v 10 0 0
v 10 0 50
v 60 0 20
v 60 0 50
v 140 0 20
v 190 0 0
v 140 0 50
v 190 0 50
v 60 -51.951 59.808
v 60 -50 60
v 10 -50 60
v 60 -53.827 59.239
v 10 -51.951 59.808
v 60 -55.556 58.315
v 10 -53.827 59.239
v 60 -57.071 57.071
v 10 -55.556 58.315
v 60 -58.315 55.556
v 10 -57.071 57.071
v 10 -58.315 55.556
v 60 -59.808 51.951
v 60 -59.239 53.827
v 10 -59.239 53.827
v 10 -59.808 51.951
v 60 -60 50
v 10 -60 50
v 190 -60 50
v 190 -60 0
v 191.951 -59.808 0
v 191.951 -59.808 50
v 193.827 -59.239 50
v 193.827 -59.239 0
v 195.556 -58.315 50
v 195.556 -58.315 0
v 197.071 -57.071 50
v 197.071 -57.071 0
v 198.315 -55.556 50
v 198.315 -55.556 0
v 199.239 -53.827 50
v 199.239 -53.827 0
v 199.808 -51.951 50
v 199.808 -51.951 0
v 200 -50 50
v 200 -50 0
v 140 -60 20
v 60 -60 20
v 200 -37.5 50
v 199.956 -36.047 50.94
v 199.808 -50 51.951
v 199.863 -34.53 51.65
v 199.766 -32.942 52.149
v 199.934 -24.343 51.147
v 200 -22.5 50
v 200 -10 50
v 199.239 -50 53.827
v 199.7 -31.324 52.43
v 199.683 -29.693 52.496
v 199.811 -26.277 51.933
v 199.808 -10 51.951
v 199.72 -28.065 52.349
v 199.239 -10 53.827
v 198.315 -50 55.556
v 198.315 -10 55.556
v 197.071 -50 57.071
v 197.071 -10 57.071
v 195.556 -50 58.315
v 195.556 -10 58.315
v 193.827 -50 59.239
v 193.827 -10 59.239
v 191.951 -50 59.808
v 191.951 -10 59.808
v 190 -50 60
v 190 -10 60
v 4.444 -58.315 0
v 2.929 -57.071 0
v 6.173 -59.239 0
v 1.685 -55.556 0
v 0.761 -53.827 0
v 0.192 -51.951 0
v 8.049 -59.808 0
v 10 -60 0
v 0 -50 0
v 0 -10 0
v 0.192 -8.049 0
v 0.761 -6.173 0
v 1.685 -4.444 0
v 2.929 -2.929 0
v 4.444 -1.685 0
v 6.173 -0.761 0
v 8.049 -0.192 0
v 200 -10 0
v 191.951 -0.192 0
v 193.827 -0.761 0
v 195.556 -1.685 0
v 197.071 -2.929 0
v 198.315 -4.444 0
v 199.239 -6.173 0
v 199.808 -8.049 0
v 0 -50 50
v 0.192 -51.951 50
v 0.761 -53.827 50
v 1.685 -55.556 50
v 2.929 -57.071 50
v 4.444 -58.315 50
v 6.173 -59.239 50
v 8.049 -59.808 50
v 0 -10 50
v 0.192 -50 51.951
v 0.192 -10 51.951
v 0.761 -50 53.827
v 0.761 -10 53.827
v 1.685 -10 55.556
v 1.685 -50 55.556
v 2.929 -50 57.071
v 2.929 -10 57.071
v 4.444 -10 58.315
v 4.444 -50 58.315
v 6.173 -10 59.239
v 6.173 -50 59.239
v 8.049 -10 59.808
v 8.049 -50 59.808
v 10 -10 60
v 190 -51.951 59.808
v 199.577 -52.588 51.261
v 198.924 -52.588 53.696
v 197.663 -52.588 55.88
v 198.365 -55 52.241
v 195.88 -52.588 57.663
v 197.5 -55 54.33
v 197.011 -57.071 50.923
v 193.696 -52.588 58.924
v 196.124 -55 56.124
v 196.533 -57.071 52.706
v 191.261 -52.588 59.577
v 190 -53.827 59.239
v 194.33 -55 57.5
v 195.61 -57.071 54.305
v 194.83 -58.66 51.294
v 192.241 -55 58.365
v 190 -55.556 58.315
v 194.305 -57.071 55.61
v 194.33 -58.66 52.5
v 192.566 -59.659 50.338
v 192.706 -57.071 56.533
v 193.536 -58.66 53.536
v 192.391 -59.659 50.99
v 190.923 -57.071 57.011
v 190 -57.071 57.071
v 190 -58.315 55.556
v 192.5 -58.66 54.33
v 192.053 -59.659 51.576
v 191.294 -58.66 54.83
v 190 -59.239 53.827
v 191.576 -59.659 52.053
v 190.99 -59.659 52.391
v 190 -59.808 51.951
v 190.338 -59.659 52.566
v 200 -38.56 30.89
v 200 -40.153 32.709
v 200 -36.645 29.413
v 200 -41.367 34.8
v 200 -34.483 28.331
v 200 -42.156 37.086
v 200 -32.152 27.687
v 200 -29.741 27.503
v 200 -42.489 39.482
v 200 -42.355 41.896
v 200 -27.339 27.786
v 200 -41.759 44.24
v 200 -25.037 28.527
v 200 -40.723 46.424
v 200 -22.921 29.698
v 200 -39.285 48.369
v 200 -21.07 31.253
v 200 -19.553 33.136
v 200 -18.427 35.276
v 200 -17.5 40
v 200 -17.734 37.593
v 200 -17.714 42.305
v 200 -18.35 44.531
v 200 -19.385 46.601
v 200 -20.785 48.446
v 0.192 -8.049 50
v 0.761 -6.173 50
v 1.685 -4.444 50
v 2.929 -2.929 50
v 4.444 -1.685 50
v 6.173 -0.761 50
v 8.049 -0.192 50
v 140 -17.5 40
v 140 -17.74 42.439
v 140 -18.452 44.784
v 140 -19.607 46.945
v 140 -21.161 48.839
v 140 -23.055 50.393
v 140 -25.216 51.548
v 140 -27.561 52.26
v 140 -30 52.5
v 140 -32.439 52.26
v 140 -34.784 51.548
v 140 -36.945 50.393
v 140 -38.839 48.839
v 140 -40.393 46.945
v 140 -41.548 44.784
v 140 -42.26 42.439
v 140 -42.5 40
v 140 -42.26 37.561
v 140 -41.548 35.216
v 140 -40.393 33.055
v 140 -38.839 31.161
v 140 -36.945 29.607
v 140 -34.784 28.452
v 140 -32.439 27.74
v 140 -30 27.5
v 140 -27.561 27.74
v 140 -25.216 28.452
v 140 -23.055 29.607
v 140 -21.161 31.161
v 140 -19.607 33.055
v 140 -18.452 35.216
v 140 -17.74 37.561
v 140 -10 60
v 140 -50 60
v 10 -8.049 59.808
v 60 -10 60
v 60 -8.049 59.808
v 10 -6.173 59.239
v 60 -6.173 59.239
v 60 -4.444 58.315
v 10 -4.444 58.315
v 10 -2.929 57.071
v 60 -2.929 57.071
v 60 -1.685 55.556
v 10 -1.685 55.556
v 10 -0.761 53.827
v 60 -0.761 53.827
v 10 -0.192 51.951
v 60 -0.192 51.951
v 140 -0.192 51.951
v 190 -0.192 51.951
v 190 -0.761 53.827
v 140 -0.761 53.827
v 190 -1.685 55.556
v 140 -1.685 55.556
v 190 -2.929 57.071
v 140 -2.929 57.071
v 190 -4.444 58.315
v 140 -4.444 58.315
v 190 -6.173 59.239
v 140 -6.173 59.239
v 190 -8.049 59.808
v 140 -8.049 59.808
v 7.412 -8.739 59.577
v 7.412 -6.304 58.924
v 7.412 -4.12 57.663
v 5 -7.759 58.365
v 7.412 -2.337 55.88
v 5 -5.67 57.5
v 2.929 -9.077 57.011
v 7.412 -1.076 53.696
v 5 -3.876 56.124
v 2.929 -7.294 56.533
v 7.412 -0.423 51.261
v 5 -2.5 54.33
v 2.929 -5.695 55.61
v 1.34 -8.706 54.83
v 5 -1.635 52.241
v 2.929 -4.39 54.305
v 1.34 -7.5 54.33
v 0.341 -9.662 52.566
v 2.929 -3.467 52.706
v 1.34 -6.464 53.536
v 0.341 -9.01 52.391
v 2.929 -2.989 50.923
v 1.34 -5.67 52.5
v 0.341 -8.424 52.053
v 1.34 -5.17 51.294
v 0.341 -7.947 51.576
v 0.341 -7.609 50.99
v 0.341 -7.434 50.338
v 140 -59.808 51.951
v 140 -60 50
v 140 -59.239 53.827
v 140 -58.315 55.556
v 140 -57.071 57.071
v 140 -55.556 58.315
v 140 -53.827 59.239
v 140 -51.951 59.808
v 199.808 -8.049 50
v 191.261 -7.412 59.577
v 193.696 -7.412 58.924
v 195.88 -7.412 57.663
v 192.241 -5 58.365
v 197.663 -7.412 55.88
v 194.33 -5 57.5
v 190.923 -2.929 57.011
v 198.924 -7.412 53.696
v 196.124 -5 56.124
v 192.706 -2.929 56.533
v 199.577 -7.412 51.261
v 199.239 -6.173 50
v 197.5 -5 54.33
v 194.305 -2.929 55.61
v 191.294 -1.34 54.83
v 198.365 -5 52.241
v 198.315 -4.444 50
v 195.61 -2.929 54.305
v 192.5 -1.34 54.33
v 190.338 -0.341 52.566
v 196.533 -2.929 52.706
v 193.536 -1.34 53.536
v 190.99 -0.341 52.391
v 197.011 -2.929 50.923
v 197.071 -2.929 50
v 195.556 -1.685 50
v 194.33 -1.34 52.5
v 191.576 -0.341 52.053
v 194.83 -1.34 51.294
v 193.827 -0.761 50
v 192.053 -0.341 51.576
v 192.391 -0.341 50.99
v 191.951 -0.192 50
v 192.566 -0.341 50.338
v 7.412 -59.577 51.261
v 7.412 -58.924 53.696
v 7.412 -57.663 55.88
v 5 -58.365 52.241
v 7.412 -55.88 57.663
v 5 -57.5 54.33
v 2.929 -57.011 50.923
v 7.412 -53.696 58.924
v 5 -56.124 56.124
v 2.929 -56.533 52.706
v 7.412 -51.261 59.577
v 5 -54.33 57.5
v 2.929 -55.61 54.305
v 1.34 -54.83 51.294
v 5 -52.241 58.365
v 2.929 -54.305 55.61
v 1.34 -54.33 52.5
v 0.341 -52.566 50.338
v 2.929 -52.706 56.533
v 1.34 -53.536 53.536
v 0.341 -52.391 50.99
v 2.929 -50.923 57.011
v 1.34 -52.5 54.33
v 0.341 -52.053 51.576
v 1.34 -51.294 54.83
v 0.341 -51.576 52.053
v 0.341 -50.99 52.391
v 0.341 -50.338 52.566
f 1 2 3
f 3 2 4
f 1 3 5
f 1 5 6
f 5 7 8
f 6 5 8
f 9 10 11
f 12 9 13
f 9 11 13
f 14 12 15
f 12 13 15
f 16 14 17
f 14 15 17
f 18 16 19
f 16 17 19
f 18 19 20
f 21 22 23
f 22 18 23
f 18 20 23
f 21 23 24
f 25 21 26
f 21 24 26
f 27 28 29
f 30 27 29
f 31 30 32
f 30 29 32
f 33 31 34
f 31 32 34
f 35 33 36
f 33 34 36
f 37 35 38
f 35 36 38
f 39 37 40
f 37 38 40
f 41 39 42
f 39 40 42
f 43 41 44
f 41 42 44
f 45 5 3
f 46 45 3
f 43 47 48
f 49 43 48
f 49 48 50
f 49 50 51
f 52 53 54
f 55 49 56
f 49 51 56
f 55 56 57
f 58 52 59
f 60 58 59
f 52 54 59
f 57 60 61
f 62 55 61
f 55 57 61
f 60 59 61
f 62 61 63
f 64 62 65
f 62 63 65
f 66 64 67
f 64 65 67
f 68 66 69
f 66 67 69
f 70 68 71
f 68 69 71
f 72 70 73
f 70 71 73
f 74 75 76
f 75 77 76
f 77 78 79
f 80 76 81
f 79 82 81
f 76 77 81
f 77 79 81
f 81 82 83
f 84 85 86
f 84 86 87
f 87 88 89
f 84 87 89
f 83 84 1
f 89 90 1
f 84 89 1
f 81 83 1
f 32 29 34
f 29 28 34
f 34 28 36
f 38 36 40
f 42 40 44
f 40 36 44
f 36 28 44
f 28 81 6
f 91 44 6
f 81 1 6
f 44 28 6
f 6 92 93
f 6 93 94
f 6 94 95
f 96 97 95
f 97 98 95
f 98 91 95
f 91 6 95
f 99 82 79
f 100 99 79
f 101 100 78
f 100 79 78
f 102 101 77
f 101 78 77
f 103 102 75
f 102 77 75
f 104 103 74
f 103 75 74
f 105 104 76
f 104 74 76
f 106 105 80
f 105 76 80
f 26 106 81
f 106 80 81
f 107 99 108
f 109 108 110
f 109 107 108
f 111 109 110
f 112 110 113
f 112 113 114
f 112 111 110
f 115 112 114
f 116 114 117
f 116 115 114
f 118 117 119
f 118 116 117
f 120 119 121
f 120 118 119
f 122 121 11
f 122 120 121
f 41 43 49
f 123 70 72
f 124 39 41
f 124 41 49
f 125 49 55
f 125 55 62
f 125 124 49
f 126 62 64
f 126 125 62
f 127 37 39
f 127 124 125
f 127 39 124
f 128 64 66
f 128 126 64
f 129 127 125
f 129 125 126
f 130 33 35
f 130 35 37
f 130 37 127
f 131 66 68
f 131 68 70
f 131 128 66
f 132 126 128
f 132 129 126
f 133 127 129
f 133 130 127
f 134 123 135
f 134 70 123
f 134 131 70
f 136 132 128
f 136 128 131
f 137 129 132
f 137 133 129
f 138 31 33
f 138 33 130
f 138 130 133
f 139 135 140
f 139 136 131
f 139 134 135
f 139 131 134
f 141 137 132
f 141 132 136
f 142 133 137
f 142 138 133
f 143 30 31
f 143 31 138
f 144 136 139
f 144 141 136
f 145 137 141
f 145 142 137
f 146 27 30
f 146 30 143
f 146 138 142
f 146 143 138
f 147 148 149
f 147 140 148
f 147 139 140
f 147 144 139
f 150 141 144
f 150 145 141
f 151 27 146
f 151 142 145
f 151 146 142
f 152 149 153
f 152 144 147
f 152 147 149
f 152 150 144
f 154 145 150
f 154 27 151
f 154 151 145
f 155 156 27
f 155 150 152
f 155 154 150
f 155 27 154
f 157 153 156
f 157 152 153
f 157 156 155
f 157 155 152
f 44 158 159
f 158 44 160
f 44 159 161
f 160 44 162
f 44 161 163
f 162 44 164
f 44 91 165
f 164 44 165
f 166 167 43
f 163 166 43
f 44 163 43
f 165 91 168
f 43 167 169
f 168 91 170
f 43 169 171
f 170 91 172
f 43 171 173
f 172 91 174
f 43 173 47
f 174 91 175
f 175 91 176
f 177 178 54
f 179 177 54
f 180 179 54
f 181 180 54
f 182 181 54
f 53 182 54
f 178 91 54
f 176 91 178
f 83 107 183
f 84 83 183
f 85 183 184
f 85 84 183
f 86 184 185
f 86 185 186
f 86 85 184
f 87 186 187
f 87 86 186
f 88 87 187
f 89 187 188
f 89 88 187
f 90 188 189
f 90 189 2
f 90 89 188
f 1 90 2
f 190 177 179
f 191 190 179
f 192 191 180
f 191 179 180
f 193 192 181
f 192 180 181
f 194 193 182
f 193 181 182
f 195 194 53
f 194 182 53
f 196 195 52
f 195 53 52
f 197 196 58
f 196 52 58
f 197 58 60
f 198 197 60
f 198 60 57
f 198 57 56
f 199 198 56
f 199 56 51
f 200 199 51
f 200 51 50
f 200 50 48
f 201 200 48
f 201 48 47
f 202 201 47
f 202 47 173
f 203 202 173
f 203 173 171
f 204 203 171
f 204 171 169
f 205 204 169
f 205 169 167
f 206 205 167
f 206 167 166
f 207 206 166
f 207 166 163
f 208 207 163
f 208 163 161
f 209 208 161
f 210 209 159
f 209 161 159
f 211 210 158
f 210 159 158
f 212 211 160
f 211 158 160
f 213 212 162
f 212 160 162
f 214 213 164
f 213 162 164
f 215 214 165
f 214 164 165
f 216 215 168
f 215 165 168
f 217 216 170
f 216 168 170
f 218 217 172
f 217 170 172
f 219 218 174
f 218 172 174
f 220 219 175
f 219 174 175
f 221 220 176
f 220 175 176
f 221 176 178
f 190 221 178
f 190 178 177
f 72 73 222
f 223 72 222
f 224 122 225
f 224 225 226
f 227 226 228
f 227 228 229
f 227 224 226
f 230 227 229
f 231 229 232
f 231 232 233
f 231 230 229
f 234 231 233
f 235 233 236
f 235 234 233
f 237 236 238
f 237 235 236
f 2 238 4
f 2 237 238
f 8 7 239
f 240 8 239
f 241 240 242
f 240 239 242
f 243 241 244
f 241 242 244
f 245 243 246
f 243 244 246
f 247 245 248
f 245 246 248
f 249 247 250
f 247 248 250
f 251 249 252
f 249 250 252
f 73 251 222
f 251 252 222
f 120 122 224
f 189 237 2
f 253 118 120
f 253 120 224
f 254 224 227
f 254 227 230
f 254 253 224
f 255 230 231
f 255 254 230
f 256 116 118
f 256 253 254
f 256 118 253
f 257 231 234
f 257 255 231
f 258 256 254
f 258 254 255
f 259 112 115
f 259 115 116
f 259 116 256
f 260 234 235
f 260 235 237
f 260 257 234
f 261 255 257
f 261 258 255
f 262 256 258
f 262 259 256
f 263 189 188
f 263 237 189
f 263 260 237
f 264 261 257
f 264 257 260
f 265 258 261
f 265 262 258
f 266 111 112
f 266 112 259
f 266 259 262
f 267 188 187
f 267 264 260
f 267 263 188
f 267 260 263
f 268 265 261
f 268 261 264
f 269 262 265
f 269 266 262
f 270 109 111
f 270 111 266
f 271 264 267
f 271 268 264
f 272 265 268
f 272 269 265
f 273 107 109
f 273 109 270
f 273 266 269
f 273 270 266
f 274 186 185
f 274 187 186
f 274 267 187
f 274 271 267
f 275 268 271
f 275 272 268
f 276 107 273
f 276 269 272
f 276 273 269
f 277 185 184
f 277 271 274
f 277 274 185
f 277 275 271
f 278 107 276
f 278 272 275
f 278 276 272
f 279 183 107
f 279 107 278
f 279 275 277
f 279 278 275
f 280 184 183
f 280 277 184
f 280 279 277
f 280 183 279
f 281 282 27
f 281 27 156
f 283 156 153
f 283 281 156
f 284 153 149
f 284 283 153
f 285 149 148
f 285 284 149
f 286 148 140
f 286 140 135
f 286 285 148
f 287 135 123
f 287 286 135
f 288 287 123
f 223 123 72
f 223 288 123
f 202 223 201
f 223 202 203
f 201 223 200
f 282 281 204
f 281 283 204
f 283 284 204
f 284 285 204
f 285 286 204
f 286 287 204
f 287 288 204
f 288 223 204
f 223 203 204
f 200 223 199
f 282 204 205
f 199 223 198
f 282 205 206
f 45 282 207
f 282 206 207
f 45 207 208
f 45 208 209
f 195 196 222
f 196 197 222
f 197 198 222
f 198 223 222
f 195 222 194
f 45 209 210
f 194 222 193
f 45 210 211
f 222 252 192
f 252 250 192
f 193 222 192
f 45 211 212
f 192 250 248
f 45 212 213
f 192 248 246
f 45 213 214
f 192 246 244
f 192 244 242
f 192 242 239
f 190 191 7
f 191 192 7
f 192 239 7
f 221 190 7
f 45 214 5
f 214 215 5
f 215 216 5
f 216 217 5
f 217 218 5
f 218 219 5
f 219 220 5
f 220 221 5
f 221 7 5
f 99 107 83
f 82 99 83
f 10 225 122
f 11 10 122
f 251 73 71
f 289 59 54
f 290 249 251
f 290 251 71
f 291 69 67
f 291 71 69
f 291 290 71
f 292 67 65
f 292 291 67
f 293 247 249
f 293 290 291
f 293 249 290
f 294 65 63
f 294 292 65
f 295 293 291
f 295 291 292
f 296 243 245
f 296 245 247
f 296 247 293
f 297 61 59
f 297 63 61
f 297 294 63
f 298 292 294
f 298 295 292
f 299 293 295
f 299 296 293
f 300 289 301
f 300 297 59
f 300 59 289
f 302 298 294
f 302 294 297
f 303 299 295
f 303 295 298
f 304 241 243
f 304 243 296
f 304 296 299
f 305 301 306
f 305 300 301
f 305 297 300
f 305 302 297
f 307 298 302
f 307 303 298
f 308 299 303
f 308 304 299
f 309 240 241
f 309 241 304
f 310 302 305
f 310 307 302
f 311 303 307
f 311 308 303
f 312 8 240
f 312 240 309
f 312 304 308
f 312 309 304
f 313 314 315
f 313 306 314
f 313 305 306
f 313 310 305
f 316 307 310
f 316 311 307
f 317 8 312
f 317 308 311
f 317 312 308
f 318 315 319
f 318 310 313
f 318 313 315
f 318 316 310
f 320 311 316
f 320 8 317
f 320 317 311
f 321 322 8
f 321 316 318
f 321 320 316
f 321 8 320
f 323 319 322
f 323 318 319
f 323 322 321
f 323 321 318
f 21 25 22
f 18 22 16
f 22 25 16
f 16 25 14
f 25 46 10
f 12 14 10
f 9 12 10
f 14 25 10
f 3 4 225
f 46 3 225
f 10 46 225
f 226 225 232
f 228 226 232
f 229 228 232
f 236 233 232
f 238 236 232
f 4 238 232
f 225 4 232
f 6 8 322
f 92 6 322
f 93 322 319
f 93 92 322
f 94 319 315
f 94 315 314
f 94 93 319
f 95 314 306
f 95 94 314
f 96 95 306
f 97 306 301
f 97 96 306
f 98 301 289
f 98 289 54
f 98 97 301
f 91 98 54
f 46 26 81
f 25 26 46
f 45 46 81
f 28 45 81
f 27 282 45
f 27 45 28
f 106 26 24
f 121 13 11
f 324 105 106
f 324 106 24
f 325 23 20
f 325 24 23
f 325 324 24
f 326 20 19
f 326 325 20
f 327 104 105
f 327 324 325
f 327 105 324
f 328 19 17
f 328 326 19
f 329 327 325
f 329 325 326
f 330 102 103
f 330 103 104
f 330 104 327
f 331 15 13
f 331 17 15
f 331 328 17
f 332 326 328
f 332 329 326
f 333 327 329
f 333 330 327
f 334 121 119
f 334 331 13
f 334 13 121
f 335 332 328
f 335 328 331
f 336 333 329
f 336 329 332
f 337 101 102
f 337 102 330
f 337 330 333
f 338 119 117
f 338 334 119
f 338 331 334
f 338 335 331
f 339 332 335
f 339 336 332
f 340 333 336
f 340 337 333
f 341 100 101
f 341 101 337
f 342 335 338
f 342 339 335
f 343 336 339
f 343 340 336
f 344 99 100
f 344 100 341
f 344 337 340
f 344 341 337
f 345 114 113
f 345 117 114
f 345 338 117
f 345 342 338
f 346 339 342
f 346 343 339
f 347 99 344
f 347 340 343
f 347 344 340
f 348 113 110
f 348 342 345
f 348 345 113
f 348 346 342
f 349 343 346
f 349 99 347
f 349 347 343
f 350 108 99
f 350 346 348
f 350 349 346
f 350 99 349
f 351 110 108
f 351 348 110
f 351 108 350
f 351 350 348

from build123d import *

# Parameters (mm, degrees)
F1_DEPTH     = 60
F2_R         = 12.5
F3_DEPTH     = 70
F4_T1_DEPTH  = 75
F4_T3_DEPTH  = 40
F4_T5_DEPTH  = 75
F4_T7_DEPTH  = 75
F4_S11_W     = 10
F4_S11_H     = 10
F4_T12_DEPTH = 10
F4_S17_W     = 10
F4_S17_H     = 10
F4_T18_DEPTH = 10
F4_S23_W     = 10
F4_S23_H     = 10
F4_T24_DEPTH = 10
F4_S29_W     = 10
F4_S29_H     = 10
F4_T30_DEPTH = 10


# Not quite as in the source:
# - a fillet or chamfer that OpenCascade refuses, or shapes differently, is made with other operations: its cross-section is extruded or revolved along the edge and cut away or added


with BuildPart() as f1:
    # F0 (on Front) → F1 (new body)
    with BuildSketch(Plane.XZ):
        Polygon((0, 60), (0, 0), (200, 0), (200, 60), (140, 60), (140, 20), (60, 20), (60, 60), align=None)
    extrude(amount=F1_DEPTH)

    # F2 (on face) → F3 (cut)
    with BuildSketch(Plane.YZ.offset(200)):
        with Locations((-30, 40)):
            Circle(F2_R)
    extrude(amount=-F3_DEPTH, mode=Mode.SUBTRACT)

    # F4: fillet of radius 10 on 10 edges, made by hand

    # F4_s2 → F4_t1 (cut)
    with BuildSketch(Plane.XY.offset(-25)):
        with BuildLine():
            ThreePointArc((0, -50), (2.9289321881, -57.0710678119), (10, -60))
            Line((10, -60), (0, -60))
            Line((0, -60), (0, -50))
        make_face()
        with BuildLine():
            ThreePointArc((0, -10), (2.9289321881, -2.9289321881), (10, 0))
            Line((10, 0), (0, 0))
            Line((0, 0), (0, -10))
        make_face()
        with BuildLine():
            ThreePointArc((190, -60), (197.0710678119, -57.0710678119), (200, -50))
            Line((200, -50), (200, -60))
            Line((200, -60), (190, -60))
        make_face()
        with BuildLine():
            ThreePointArc((190, 0), (197.0710678119, -2.9289321881), (200, -10))
            Line((200, -10), (200, 0))
            Line((200, 0), (190, 0))
        make_face()
    extrude(amount=F4_T1_DEPTH, mode=Mode.SUBTRACT)

    # F4_s4 → F4_t3 (cut)
    with BuildSketch(Plane.XZ.offset(10)):
        with BuildLine():
            ThreePointArc((0, 50), (2.9289321881, 57.0710678119), (10, 60))
            Line((10, 60), (0, 60))
            Line((0, 60), (0, 50))
        make_face()
        with BuildLine():
            ThreePointArc((200, 50), (197.0710678119, 57.0710678119), (190, 60))
            Line((190, 60), (200, 60))
            Line((200, 60), (200, 50))
        make_face()
    extrude(amount=F4_T3_DEPTH, mode=Mode.SUBTRACT)

    # F4_s6 → F4_t5 (cut)
    with BuildSketch(Plane.YZ.offset(10)):
        with BuildLine():
            ThreePointArc((-10, 60), (-2.9289321881, 57.0710678119), (0, 50))
            Line((0, 50), (0, 60))
            Line((0, 60), (-10, 60))
        make_face()
        with BuildLine():
            ThreePointArc((-50, 60), (-57.0710678119, 57.0710678119), (-60, 50))
            Line((-60, 50), (-60, 60))
            Line((-60, 60), (-50, 60))
        make_face()
    extrude(amount=F4_T5_DEPTH, mode=Mode.SUBTRACT)

    # F4_s8 → F4_t7 (cut)
    with BuildSketch(Plane.YZ.offset(115)):
        with BuildLine():
            ThreePointArc((-60, 50), (-57.0710678119, 57.0710678119), (-50, 60))
            Line((-50, 60), (-60, 60))
            Line((-60, 60), (-60, 50))
        make_face()
        with BuildLine():
            ThreePointArc((0, 50), (-2.9289321881, 57.0710678119), (-10, 60))
            Line((-10, 60), (0, 60))
            Line((0, 60), (0, 50))
        make_face()
    extrude(amount=F4_T7_DEPTH, mode=Mode.SUBTRACT)


with BuildPart() as f4_tool10:
    # F4_s11 → F4_t12 (new body)
    with BuildSketch(Plane.YZ.offset(10)):
        with Locations((-55, 55)):
            Rectangle(F4_S11_W, F4_S11_H)
    extrude(amount=-F4_T12_DEPTH)

    # F4_s13 → F4_t14 (revolve, cut)
    with BuildSketch(Plane(origin=(10, -50, 50), x_dir=(0, 0.7071067812, -0.7071067812), z_dir=(0, 0.7071067812, 0.7071067812))):
        with BuildLine():
            ThreePointArc((0, -10), (10, 0), (0, 10))
            Line((0, 10), (0, -10))
        make_face()
    revolve(axis=Axis((10, -50, 50), (-1, 0, 0)), mode=Mode.SUBTRACT)


with BuildPart() as f1_1:
    add(f1.part)

    # F4_t9: cut F4_tool10
    add(f4_tool10.part, mode=Mode.SUBTRACT)


with BuildPart() as f4_tool16:
    # F4_s17 → F4_t18 (new body)
    with BuildSketch(Plane.YZ.offset(10)):
        with Locations((-5, 55)):
            Rectangle(F4_S17_W, F4_S17_H)
    extrude(amount=-F4_T18_DEPTH)

    # F4_s19 → F4_t20 (revolve, cut)
    with BuildSketch(Plane(origin=(10, -10, 50), x_dir=(0, -0.7071067812, -0.7071067812), z_dir=(0, 0.7071067812, -0.7071067812))):
        with BuildLine():
            ThreePointArc((0, -10), (10, 0), (0, 10))
            Line((0, 10), (0, -10))
        make_face()
    revolve(axis=Axis((10, -10, 50), (-1, 0, 0)), mode=Mode.SUBTRACT)


with BuildPart() as f1_2:
    add(f1_1.part)

    # F4_t15: cut F4_tool16
    add(f4_tool16.part, mode=Mode.SUBTRACT)


with BuildPart() as f4_tool22:
    # F4_s23 → F4_t24 (new body)
    with BuildSketch(Plane.XZ.offset(50)):
        with Locations((195, 55)):
            Rectangle(F4_S23_W, F4_S23_H)
    extrude(amount=F4_T24_DEPTH)

    # F4_s25 → F4_t26 (revolve, cut)
    with BuildSketch(Plane(origin=(190, -50, 50), x_dir=(-0.7071067812, 0, -0.7071067812), z_dir=(-0.7071067812, 0, 0.7071067812))):
        with BuildLine():
            ThreePointArc((0, -10), (10, 0), (0, 10))
            Line((0, 10), (0, -10))
        make_face()
    revolve(axis=Axis((190, -50, 50), (0, -1, 0)), mode=Mode.SUBTRACT)


with BuildPart() as f1_3:
    add(f1_2.part)

    # F4_t21: cut F4_tool22
    add(f4_tool22.part, mode=Mode.SUBTRACT)


with BuildPart() as f4_tool28:
    # F4_s29 → F4_t30 (new body)
    with BuildSketch(Plane.XZ.offset(10)):
        with Locations((195, 55)):
            Rectangle(F4_S29_W, F4_S29_H)
    extrude(amount=-F4_T30_DEPTH)

    # F4_s31 → F4_t32 (revolve, cut)
    with BuildSketch(Plane(origin=(190, -10, 50), x_dir=(-0.7071067812, 0, -0.7071067812), z_dir=(0.7071067812, 0, -0.7071067812))):
        with BuildLine():
            ThreePointArc((0, -10), (10, 0), (0, 10))
            Line((0, 10), (0, -10))
        make_face()
    revolve(axis=Axis((190, -10, 50), (0, 1, 0)), mode=Mode.SUBTRACT)


with BuildPart() as f1_4:
    add(f1_3.part)

    # F4_t27: cut F4_tool28
    add(f4_tool28.part, mode=Mode.SUBTRACT)


solid = f1_4.part
